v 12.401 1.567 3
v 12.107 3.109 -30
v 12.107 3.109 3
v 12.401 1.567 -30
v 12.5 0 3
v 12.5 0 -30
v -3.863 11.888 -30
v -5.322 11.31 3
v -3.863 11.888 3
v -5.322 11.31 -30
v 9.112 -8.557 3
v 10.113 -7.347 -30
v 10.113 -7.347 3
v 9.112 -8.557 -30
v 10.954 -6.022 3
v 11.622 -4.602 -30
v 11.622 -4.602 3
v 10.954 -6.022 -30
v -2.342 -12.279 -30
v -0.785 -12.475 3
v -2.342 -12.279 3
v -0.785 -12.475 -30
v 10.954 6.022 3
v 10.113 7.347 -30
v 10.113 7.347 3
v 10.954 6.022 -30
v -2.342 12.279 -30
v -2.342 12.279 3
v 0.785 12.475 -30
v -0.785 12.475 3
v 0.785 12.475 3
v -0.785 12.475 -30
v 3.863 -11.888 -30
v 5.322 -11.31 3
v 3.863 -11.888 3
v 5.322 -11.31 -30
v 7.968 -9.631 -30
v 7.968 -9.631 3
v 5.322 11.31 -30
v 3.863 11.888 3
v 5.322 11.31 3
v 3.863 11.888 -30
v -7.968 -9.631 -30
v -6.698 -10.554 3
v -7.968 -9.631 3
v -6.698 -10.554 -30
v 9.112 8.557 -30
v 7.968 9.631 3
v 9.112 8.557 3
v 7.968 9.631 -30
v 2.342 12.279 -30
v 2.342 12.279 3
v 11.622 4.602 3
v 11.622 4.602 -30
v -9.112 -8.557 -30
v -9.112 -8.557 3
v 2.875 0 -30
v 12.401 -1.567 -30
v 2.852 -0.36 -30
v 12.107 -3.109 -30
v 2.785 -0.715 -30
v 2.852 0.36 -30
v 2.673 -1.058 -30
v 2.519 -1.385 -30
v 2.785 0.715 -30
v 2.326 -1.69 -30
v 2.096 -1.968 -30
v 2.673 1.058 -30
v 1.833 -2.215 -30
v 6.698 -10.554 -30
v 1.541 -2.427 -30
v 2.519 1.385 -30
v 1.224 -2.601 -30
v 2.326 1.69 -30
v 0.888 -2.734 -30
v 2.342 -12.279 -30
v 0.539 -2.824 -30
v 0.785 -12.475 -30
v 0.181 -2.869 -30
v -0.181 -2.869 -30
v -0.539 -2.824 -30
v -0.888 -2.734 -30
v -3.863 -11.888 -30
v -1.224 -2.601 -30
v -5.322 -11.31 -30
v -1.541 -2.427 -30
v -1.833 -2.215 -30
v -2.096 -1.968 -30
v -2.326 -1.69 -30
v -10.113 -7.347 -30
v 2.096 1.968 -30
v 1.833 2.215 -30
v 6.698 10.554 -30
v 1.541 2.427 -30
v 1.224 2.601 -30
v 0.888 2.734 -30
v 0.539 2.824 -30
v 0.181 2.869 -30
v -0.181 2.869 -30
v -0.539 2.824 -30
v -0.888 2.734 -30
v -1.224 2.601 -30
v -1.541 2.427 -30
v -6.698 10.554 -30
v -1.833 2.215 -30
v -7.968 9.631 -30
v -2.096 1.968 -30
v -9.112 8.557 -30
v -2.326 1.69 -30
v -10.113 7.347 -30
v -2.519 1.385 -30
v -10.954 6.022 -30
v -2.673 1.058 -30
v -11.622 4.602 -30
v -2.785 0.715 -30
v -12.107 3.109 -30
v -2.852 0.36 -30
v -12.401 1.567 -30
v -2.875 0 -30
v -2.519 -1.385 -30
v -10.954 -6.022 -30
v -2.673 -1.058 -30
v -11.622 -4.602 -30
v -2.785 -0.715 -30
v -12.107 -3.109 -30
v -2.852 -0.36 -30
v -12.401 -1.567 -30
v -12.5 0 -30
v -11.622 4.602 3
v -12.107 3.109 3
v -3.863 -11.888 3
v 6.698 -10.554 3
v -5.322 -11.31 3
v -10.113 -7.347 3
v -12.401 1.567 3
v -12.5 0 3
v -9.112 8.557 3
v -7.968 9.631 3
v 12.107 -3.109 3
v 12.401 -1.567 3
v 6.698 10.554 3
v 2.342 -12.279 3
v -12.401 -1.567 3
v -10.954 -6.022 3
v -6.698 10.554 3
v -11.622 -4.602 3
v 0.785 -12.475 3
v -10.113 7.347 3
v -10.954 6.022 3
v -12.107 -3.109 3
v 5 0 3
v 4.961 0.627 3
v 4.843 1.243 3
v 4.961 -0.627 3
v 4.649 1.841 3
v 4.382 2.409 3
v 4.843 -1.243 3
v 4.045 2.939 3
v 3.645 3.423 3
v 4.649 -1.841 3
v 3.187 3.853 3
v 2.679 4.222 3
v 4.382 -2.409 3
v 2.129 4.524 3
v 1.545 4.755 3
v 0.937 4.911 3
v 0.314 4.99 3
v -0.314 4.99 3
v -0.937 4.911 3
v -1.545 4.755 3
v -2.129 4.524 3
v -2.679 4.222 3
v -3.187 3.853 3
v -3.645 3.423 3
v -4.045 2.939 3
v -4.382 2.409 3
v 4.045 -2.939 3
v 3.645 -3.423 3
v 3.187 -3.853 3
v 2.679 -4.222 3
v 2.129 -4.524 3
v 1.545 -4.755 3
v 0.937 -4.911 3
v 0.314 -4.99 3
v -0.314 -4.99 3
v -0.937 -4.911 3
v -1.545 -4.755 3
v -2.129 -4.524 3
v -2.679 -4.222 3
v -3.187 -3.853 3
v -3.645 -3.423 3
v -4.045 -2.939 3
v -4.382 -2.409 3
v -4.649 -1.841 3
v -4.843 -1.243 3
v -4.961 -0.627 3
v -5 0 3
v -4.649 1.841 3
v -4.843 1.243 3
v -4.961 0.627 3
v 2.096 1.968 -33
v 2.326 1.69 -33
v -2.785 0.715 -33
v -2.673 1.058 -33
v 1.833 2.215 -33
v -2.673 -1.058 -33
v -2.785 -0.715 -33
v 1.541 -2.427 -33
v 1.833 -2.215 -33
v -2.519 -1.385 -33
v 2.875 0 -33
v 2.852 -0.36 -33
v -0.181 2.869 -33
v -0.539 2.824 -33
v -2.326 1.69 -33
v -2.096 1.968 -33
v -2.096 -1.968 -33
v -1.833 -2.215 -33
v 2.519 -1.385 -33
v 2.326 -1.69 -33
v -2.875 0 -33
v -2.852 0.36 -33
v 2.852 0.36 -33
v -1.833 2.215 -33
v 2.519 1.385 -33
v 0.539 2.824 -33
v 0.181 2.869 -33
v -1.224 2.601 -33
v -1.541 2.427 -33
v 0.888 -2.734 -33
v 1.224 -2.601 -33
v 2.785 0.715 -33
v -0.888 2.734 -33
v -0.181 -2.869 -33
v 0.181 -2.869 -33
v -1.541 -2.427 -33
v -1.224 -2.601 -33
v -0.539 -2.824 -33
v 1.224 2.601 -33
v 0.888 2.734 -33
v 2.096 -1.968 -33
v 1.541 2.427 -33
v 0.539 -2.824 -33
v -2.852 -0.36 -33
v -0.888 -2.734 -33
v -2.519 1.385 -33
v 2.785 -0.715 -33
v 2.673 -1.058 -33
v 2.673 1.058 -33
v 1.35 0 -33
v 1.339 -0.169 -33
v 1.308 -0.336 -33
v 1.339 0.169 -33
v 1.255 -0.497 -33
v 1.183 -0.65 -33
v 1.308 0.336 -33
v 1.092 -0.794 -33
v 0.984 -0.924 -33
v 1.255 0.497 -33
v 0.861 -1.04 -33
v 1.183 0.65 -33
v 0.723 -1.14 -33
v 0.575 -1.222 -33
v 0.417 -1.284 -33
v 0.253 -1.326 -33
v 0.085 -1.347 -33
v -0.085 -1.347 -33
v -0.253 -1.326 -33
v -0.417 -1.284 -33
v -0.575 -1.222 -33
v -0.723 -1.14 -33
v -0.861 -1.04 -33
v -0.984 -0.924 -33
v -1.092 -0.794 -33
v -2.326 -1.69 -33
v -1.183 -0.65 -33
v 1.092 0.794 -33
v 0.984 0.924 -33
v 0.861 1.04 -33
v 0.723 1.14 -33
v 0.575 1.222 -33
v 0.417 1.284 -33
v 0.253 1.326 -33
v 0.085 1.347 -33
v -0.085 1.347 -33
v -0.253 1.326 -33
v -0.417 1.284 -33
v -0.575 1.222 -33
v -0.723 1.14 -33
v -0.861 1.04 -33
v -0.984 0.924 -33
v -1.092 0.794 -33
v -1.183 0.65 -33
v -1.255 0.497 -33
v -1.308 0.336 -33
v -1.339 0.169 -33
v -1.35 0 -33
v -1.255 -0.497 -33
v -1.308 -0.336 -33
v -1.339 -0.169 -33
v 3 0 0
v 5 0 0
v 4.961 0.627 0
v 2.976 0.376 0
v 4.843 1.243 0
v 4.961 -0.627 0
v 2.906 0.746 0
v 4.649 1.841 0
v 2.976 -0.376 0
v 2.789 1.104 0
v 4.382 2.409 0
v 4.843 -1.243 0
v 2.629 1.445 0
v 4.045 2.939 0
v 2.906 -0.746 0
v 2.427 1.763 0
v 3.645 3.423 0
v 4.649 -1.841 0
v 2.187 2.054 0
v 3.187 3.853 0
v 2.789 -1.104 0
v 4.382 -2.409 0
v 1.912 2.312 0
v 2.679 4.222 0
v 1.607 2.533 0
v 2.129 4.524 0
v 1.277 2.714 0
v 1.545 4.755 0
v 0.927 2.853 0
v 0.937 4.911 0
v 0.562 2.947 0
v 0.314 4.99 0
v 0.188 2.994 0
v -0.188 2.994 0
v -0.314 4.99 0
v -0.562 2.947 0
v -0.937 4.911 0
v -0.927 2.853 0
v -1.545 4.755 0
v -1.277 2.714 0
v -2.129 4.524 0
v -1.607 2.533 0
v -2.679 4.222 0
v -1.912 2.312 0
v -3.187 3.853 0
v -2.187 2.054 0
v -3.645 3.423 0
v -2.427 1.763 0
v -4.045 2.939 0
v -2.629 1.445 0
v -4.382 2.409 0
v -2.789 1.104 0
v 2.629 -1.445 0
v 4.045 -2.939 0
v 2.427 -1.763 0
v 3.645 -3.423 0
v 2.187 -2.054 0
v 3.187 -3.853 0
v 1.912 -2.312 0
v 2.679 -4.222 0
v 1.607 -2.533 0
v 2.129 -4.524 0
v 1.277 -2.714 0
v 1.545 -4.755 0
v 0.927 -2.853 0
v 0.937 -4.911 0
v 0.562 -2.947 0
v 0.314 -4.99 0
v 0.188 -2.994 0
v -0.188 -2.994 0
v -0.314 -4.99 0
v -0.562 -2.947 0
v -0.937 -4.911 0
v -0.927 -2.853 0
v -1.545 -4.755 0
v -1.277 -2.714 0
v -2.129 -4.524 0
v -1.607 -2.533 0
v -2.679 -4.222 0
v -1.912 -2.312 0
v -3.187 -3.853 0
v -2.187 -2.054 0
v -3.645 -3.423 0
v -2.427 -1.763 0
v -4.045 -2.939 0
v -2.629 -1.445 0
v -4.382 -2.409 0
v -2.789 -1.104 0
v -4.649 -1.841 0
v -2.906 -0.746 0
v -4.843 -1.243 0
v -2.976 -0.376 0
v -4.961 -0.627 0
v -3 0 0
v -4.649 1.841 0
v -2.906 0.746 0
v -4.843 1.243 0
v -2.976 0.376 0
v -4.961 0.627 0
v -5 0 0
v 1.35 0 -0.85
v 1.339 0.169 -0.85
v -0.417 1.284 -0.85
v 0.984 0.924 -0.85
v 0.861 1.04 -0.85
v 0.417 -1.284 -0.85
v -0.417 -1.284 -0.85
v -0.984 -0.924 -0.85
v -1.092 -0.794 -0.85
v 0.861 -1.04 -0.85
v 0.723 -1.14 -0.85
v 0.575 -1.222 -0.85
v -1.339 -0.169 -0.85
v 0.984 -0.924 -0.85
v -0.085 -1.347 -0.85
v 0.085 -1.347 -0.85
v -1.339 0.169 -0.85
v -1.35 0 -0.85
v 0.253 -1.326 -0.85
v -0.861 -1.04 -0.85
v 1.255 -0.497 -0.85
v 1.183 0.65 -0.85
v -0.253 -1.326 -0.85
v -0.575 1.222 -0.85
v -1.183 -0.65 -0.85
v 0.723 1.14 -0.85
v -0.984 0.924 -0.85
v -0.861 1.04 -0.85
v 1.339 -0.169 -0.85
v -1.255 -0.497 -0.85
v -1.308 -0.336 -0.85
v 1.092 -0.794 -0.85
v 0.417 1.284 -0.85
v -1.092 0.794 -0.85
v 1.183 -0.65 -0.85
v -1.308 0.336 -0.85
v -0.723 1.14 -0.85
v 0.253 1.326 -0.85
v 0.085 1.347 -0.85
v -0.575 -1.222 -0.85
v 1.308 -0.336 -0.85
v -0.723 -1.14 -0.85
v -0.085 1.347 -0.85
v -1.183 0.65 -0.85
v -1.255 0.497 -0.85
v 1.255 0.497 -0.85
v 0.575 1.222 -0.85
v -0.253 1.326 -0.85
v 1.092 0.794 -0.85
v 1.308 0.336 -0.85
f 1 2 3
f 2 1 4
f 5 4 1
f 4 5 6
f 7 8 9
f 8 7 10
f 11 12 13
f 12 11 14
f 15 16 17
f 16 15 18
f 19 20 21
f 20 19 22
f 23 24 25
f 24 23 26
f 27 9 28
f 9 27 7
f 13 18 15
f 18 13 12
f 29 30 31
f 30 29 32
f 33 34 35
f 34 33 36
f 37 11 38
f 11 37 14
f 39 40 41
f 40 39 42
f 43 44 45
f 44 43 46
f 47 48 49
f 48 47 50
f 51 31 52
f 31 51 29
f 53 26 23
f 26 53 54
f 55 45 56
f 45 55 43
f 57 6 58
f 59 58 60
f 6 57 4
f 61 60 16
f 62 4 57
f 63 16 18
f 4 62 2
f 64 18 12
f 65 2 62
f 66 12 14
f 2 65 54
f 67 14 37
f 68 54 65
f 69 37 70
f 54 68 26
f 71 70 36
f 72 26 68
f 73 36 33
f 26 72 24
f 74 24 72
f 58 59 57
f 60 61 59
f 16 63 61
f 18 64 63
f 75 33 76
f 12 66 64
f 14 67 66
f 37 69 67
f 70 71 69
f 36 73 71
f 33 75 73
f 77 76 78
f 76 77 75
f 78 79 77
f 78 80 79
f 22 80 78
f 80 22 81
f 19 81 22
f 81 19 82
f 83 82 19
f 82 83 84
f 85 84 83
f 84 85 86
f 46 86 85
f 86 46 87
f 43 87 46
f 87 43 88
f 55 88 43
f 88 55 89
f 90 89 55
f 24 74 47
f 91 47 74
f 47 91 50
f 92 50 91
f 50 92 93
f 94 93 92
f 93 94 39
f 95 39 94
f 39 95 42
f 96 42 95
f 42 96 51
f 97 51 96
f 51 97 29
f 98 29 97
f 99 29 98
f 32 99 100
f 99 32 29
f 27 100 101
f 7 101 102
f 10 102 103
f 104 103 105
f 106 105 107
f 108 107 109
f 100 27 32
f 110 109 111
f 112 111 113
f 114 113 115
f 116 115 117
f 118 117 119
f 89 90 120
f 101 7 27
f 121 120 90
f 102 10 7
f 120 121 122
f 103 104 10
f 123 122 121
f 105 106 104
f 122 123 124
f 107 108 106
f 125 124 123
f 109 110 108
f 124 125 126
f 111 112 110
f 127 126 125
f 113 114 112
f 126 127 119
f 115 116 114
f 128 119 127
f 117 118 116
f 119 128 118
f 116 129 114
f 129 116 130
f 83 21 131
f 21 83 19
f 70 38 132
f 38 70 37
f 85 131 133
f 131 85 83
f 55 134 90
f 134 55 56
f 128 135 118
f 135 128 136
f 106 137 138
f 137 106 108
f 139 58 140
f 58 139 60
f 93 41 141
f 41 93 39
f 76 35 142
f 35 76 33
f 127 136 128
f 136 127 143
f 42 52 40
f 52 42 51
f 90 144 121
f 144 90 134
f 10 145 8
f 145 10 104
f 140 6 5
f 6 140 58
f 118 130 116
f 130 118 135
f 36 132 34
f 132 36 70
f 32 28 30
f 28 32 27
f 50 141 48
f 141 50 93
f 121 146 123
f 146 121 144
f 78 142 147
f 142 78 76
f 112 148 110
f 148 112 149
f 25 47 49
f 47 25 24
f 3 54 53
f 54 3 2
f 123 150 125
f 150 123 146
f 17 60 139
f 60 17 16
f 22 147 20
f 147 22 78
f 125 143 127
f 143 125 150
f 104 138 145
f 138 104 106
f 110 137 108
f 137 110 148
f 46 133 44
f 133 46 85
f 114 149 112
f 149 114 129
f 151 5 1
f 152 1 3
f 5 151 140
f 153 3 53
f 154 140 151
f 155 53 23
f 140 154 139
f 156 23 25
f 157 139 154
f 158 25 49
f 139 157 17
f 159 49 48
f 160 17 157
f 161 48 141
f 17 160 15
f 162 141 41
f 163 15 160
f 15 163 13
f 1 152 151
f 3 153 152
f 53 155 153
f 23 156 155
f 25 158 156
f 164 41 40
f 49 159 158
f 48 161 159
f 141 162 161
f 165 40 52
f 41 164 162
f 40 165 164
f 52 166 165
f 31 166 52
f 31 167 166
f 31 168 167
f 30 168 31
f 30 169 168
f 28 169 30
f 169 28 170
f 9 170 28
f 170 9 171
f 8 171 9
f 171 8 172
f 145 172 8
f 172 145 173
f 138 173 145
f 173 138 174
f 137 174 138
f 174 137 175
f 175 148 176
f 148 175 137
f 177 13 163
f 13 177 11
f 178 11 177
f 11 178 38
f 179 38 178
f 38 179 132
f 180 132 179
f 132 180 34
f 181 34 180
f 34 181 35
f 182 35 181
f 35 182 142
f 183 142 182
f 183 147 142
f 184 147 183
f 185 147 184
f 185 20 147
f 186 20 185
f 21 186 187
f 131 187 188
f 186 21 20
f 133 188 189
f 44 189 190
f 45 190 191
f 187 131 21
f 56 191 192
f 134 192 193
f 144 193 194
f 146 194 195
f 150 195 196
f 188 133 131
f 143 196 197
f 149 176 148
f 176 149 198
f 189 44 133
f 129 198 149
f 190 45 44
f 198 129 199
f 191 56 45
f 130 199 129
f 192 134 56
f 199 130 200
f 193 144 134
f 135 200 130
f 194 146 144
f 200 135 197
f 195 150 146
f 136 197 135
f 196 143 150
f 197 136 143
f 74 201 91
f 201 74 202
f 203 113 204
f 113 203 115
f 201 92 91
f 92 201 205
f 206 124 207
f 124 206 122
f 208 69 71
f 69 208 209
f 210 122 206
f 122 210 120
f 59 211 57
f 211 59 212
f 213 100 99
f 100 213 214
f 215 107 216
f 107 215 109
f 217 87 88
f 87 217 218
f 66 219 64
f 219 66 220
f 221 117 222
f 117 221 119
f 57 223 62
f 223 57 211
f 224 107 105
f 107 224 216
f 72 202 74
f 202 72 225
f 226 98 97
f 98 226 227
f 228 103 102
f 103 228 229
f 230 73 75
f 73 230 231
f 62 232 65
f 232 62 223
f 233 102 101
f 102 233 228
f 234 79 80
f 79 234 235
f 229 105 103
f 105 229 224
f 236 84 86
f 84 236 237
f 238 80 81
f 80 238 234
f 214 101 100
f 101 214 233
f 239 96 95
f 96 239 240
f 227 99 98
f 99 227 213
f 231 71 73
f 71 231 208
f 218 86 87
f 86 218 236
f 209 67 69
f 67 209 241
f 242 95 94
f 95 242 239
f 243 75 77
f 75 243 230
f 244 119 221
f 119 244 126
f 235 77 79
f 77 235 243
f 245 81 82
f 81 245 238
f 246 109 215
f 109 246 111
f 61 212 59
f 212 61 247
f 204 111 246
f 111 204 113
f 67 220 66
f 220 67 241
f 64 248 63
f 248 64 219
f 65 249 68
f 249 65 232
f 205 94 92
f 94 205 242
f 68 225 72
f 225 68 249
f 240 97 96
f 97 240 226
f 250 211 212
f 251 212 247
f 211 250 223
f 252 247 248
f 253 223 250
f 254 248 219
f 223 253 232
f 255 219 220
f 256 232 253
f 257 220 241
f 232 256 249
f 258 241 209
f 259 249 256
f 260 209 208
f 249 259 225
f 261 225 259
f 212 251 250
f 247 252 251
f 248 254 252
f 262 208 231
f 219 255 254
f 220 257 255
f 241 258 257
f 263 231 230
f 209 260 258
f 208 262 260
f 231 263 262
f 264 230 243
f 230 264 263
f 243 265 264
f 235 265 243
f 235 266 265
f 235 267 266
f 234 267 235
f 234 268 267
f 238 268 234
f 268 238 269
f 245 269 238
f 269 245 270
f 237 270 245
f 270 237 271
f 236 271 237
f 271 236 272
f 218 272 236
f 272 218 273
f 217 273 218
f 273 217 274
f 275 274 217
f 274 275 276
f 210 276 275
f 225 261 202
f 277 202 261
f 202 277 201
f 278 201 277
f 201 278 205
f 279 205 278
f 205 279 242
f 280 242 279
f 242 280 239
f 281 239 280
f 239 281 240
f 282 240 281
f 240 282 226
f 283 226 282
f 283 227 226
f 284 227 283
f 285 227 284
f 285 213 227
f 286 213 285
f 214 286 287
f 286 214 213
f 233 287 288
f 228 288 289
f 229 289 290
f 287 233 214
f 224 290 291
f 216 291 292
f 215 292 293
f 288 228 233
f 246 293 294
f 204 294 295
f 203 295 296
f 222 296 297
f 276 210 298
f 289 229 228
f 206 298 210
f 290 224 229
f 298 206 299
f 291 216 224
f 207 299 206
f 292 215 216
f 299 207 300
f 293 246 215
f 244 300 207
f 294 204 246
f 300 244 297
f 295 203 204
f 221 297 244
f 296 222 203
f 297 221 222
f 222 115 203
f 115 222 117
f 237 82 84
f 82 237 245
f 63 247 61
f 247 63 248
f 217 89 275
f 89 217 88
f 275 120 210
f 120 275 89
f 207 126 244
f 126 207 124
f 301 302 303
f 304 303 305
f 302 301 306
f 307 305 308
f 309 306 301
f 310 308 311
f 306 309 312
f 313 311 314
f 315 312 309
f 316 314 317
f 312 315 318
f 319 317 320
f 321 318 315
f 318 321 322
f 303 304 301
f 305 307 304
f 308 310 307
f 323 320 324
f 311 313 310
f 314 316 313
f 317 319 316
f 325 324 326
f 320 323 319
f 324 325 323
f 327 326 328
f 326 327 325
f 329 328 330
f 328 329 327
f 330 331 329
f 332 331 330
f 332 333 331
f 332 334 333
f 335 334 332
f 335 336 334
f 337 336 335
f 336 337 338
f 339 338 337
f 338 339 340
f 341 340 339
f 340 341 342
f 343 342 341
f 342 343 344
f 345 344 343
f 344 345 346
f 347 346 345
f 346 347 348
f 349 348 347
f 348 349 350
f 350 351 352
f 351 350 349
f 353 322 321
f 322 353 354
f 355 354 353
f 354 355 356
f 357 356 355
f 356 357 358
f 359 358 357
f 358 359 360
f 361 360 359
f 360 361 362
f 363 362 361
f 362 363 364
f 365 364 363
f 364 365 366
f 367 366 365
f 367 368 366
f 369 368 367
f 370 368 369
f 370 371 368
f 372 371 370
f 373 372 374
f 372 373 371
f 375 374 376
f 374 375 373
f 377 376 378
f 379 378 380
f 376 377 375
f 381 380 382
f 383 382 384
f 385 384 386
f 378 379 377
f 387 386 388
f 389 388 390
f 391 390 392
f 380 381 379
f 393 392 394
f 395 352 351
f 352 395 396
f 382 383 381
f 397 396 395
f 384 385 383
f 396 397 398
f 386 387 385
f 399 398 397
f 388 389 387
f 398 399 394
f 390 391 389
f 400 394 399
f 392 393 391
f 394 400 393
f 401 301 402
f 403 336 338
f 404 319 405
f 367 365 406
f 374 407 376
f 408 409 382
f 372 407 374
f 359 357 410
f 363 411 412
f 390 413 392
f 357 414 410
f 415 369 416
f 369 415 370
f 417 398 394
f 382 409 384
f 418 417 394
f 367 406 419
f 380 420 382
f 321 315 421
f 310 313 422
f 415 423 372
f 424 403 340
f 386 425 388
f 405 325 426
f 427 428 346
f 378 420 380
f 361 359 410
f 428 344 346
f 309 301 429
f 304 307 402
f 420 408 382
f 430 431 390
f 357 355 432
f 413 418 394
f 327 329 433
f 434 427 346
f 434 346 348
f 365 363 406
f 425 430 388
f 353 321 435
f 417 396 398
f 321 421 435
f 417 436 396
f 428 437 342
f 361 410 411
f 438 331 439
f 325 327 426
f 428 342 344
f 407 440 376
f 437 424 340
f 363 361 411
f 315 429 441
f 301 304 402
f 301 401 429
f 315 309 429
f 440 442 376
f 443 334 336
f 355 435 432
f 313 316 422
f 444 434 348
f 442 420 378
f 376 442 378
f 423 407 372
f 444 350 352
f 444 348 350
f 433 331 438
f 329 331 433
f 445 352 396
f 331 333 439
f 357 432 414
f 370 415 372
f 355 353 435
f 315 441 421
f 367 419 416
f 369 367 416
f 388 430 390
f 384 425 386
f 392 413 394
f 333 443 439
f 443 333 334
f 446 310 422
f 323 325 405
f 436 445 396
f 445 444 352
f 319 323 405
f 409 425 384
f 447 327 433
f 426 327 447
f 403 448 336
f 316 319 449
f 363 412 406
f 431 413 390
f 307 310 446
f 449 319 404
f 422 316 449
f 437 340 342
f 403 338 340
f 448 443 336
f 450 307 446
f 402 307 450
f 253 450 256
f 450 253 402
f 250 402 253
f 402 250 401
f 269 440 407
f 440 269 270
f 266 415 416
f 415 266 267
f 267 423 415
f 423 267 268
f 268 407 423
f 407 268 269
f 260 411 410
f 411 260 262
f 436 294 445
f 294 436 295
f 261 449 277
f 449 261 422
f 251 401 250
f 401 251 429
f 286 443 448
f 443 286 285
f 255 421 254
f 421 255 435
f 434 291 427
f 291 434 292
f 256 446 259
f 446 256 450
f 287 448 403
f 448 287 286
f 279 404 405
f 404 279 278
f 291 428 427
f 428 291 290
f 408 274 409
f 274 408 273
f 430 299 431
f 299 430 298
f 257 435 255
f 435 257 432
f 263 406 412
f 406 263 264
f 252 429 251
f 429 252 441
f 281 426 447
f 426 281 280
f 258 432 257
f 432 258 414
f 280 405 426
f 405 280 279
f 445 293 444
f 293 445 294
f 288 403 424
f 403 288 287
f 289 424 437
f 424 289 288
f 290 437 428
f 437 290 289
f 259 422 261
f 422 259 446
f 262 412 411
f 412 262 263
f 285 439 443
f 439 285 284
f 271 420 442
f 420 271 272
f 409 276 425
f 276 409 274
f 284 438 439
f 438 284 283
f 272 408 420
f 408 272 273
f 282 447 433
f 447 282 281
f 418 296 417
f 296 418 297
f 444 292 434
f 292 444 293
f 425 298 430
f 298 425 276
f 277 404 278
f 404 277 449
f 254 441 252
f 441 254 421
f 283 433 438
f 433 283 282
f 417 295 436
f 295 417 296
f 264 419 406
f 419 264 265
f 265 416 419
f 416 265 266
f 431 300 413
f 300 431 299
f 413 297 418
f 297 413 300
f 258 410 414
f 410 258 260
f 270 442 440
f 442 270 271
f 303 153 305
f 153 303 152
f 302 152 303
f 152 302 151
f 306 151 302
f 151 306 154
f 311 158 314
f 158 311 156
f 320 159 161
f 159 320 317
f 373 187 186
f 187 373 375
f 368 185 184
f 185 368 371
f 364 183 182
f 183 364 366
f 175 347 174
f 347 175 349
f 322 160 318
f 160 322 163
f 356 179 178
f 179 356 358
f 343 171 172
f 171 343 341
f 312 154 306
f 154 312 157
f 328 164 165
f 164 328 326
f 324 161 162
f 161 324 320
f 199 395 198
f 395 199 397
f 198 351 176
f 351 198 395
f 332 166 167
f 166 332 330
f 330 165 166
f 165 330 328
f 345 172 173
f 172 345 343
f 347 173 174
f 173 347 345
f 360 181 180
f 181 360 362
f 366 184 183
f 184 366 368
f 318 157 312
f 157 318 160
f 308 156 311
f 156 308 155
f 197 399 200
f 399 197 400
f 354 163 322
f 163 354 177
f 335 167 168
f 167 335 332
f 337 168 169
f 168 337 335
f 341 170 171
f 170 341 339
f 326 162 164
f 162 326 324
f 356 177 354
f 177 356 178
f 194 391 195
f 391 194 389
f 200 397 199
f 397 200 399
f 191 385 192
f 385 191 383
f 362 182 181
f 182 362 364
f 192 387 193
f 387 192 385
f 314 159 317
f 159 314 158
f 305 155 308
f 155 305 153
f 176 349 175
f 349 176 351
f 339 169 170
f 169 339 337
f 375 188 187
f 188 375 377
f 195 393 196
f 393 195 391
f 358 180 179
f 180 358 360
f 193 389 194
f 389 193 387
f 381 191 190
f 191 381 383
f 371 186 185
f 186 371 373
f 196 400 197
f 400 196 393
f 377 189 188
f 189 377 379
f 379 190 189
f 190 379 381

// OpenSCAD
$fn = 50;


difference() {
	union() {
		translate(v = [0, 0, -30.0000000000]) {
			cylinder(h = 33, r = 12.5000000000);
		}
		#translate(v = [0, 0, -33.0000000000]) {
			cylinder(h = 33, r = 2.8750000000);
		}
	}
	union() {
		translate(v = [0, 0, 0]) {
			rotate(a = [0, 0, 0]) {
				difference() {
					union() {
						translate(v = [0, 0, -33.0000000000]) {
							cylinder(h = 33, r = 1.0000000000);
						}
						translate(v = [0, 0, -0.8500000000]) {
							cylinder(h = 0.8500000000, r1 = 1.3500000000, r2 = 3.0000000000);
						}
						translate(v = [0, 0, -33.0000000000]) {
							cylinder(h = 33, r = 1.3500000000);
						}
						translate(v = [0, 0, -33.0000000000]) {
							cylinder(h = 33, r = 1.0000000000);
						}
					}
					union();
				}
			}
		}
		#cylinder(h = 3, r = 5.0000000000);
	}
}
